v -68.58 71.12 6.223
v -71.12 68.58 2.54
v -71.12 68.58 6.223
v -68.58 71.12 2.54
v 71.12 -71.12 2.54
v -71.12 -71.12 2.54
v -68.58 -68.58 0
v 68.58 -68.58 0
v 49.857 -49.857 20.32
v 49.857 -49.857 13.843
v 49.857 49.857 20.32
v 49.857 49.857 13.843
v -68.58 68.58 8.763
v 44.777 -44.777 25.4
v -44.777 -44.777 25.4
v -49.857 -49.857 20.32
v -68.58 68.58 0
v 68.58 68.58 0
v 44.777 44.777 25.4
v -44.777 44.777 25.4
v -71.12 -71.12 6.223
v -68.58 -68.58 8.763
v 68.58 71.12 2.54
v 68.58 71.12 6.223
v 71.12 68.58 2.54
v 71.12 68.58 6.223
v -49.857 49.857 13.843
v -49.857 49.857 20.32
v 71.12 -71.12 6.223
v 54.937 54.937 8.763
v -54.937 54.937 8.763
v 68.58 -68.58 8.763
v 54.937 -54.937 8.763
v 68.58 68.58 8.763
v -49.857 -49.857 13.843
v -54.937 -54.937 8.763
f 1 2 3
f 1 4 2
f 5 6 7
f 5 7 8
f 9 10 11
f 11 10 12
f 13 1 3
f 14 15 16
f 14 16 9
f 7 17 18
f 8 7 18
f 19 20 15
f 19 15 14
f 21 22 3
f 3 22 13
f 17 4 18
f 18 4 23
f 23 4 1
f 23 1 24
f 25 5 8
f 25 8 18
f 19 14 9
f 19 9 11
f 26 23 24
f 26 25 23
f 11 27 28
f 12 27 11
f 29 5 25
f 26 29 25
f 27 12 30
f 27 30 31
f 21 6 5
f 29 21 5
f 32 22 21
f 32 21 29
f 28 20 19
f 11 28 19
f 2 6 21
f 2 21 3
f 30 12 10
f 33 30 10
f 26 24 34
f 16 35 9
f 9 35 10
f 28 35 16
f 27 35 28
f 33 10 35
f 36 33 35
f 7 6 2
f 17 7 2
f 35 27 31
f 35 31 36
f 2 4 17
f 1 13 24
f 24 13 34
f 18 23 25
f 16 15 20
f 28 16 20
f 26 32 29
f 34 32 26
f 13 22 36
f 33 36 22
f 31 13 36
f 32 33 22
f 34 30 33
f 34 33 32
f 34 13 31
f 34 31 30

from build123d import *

# Parameters (mm, degrees)
F0_W     = 142.24
F0_H     = 142.24
F1_DEPTH = 8.763
F2_W     = 99.7141572639
F2_H     = 99.7141572639
F3_DEPTH = 25.4
F4_SIZE  = 2.54
F5_SIZE  = 5.08


with BuildPart() as f1:
    # F0 (on Top) → F1 (new body)
    with BuildSketch(Plane.XY):
        Rectangle(F0_W, F0_H)
    extrude(amount=F1_DEPTH)

    # F2 (on Top) → F3 (join)
    with BuildSketch(Plane.XY):
        Rectangle(F2_W, F2_H)
    extrude(amount=F3_DEPTH)

    # F4
    f4_edges = [f1.edges().sort_by_distance(p)[0] for p in [
        (71.12, 71.12, 4.3815),
        (-71.12, 71.12, 4.3815),
        (0, 71.12, 0),
        (0, 71.12, 8.763),
        (71.12, 0, 8.763),
        (71.12, 0, 0),
        (0, -71.12, 8.763),
        (0, -71.12, 0),
        (-71.12, 0, 8.763),
        (-71.12, 0, 0),
    ]]
    chamfer(f4_edges, length=F4_SIZE)

    # F5
    f5_edges = [f1.edges().sort_by_distance(p)[0] for p in [
        (-49.857079, 0, 25.4),
        (0, 49.857079, 25.4),
        (0, -49.857079, 25.4),
        (49.857079, 0, 25.4),
        (-49.857079, 0, 8.763),
        (0, 49.857079, 8.763),
        (49.857079, 0, 8.763),
        (0, -49.857079, 8.763),
    ]]
    chamfer(f5_edges, length=F5_SIZE)


solid = f1.part
